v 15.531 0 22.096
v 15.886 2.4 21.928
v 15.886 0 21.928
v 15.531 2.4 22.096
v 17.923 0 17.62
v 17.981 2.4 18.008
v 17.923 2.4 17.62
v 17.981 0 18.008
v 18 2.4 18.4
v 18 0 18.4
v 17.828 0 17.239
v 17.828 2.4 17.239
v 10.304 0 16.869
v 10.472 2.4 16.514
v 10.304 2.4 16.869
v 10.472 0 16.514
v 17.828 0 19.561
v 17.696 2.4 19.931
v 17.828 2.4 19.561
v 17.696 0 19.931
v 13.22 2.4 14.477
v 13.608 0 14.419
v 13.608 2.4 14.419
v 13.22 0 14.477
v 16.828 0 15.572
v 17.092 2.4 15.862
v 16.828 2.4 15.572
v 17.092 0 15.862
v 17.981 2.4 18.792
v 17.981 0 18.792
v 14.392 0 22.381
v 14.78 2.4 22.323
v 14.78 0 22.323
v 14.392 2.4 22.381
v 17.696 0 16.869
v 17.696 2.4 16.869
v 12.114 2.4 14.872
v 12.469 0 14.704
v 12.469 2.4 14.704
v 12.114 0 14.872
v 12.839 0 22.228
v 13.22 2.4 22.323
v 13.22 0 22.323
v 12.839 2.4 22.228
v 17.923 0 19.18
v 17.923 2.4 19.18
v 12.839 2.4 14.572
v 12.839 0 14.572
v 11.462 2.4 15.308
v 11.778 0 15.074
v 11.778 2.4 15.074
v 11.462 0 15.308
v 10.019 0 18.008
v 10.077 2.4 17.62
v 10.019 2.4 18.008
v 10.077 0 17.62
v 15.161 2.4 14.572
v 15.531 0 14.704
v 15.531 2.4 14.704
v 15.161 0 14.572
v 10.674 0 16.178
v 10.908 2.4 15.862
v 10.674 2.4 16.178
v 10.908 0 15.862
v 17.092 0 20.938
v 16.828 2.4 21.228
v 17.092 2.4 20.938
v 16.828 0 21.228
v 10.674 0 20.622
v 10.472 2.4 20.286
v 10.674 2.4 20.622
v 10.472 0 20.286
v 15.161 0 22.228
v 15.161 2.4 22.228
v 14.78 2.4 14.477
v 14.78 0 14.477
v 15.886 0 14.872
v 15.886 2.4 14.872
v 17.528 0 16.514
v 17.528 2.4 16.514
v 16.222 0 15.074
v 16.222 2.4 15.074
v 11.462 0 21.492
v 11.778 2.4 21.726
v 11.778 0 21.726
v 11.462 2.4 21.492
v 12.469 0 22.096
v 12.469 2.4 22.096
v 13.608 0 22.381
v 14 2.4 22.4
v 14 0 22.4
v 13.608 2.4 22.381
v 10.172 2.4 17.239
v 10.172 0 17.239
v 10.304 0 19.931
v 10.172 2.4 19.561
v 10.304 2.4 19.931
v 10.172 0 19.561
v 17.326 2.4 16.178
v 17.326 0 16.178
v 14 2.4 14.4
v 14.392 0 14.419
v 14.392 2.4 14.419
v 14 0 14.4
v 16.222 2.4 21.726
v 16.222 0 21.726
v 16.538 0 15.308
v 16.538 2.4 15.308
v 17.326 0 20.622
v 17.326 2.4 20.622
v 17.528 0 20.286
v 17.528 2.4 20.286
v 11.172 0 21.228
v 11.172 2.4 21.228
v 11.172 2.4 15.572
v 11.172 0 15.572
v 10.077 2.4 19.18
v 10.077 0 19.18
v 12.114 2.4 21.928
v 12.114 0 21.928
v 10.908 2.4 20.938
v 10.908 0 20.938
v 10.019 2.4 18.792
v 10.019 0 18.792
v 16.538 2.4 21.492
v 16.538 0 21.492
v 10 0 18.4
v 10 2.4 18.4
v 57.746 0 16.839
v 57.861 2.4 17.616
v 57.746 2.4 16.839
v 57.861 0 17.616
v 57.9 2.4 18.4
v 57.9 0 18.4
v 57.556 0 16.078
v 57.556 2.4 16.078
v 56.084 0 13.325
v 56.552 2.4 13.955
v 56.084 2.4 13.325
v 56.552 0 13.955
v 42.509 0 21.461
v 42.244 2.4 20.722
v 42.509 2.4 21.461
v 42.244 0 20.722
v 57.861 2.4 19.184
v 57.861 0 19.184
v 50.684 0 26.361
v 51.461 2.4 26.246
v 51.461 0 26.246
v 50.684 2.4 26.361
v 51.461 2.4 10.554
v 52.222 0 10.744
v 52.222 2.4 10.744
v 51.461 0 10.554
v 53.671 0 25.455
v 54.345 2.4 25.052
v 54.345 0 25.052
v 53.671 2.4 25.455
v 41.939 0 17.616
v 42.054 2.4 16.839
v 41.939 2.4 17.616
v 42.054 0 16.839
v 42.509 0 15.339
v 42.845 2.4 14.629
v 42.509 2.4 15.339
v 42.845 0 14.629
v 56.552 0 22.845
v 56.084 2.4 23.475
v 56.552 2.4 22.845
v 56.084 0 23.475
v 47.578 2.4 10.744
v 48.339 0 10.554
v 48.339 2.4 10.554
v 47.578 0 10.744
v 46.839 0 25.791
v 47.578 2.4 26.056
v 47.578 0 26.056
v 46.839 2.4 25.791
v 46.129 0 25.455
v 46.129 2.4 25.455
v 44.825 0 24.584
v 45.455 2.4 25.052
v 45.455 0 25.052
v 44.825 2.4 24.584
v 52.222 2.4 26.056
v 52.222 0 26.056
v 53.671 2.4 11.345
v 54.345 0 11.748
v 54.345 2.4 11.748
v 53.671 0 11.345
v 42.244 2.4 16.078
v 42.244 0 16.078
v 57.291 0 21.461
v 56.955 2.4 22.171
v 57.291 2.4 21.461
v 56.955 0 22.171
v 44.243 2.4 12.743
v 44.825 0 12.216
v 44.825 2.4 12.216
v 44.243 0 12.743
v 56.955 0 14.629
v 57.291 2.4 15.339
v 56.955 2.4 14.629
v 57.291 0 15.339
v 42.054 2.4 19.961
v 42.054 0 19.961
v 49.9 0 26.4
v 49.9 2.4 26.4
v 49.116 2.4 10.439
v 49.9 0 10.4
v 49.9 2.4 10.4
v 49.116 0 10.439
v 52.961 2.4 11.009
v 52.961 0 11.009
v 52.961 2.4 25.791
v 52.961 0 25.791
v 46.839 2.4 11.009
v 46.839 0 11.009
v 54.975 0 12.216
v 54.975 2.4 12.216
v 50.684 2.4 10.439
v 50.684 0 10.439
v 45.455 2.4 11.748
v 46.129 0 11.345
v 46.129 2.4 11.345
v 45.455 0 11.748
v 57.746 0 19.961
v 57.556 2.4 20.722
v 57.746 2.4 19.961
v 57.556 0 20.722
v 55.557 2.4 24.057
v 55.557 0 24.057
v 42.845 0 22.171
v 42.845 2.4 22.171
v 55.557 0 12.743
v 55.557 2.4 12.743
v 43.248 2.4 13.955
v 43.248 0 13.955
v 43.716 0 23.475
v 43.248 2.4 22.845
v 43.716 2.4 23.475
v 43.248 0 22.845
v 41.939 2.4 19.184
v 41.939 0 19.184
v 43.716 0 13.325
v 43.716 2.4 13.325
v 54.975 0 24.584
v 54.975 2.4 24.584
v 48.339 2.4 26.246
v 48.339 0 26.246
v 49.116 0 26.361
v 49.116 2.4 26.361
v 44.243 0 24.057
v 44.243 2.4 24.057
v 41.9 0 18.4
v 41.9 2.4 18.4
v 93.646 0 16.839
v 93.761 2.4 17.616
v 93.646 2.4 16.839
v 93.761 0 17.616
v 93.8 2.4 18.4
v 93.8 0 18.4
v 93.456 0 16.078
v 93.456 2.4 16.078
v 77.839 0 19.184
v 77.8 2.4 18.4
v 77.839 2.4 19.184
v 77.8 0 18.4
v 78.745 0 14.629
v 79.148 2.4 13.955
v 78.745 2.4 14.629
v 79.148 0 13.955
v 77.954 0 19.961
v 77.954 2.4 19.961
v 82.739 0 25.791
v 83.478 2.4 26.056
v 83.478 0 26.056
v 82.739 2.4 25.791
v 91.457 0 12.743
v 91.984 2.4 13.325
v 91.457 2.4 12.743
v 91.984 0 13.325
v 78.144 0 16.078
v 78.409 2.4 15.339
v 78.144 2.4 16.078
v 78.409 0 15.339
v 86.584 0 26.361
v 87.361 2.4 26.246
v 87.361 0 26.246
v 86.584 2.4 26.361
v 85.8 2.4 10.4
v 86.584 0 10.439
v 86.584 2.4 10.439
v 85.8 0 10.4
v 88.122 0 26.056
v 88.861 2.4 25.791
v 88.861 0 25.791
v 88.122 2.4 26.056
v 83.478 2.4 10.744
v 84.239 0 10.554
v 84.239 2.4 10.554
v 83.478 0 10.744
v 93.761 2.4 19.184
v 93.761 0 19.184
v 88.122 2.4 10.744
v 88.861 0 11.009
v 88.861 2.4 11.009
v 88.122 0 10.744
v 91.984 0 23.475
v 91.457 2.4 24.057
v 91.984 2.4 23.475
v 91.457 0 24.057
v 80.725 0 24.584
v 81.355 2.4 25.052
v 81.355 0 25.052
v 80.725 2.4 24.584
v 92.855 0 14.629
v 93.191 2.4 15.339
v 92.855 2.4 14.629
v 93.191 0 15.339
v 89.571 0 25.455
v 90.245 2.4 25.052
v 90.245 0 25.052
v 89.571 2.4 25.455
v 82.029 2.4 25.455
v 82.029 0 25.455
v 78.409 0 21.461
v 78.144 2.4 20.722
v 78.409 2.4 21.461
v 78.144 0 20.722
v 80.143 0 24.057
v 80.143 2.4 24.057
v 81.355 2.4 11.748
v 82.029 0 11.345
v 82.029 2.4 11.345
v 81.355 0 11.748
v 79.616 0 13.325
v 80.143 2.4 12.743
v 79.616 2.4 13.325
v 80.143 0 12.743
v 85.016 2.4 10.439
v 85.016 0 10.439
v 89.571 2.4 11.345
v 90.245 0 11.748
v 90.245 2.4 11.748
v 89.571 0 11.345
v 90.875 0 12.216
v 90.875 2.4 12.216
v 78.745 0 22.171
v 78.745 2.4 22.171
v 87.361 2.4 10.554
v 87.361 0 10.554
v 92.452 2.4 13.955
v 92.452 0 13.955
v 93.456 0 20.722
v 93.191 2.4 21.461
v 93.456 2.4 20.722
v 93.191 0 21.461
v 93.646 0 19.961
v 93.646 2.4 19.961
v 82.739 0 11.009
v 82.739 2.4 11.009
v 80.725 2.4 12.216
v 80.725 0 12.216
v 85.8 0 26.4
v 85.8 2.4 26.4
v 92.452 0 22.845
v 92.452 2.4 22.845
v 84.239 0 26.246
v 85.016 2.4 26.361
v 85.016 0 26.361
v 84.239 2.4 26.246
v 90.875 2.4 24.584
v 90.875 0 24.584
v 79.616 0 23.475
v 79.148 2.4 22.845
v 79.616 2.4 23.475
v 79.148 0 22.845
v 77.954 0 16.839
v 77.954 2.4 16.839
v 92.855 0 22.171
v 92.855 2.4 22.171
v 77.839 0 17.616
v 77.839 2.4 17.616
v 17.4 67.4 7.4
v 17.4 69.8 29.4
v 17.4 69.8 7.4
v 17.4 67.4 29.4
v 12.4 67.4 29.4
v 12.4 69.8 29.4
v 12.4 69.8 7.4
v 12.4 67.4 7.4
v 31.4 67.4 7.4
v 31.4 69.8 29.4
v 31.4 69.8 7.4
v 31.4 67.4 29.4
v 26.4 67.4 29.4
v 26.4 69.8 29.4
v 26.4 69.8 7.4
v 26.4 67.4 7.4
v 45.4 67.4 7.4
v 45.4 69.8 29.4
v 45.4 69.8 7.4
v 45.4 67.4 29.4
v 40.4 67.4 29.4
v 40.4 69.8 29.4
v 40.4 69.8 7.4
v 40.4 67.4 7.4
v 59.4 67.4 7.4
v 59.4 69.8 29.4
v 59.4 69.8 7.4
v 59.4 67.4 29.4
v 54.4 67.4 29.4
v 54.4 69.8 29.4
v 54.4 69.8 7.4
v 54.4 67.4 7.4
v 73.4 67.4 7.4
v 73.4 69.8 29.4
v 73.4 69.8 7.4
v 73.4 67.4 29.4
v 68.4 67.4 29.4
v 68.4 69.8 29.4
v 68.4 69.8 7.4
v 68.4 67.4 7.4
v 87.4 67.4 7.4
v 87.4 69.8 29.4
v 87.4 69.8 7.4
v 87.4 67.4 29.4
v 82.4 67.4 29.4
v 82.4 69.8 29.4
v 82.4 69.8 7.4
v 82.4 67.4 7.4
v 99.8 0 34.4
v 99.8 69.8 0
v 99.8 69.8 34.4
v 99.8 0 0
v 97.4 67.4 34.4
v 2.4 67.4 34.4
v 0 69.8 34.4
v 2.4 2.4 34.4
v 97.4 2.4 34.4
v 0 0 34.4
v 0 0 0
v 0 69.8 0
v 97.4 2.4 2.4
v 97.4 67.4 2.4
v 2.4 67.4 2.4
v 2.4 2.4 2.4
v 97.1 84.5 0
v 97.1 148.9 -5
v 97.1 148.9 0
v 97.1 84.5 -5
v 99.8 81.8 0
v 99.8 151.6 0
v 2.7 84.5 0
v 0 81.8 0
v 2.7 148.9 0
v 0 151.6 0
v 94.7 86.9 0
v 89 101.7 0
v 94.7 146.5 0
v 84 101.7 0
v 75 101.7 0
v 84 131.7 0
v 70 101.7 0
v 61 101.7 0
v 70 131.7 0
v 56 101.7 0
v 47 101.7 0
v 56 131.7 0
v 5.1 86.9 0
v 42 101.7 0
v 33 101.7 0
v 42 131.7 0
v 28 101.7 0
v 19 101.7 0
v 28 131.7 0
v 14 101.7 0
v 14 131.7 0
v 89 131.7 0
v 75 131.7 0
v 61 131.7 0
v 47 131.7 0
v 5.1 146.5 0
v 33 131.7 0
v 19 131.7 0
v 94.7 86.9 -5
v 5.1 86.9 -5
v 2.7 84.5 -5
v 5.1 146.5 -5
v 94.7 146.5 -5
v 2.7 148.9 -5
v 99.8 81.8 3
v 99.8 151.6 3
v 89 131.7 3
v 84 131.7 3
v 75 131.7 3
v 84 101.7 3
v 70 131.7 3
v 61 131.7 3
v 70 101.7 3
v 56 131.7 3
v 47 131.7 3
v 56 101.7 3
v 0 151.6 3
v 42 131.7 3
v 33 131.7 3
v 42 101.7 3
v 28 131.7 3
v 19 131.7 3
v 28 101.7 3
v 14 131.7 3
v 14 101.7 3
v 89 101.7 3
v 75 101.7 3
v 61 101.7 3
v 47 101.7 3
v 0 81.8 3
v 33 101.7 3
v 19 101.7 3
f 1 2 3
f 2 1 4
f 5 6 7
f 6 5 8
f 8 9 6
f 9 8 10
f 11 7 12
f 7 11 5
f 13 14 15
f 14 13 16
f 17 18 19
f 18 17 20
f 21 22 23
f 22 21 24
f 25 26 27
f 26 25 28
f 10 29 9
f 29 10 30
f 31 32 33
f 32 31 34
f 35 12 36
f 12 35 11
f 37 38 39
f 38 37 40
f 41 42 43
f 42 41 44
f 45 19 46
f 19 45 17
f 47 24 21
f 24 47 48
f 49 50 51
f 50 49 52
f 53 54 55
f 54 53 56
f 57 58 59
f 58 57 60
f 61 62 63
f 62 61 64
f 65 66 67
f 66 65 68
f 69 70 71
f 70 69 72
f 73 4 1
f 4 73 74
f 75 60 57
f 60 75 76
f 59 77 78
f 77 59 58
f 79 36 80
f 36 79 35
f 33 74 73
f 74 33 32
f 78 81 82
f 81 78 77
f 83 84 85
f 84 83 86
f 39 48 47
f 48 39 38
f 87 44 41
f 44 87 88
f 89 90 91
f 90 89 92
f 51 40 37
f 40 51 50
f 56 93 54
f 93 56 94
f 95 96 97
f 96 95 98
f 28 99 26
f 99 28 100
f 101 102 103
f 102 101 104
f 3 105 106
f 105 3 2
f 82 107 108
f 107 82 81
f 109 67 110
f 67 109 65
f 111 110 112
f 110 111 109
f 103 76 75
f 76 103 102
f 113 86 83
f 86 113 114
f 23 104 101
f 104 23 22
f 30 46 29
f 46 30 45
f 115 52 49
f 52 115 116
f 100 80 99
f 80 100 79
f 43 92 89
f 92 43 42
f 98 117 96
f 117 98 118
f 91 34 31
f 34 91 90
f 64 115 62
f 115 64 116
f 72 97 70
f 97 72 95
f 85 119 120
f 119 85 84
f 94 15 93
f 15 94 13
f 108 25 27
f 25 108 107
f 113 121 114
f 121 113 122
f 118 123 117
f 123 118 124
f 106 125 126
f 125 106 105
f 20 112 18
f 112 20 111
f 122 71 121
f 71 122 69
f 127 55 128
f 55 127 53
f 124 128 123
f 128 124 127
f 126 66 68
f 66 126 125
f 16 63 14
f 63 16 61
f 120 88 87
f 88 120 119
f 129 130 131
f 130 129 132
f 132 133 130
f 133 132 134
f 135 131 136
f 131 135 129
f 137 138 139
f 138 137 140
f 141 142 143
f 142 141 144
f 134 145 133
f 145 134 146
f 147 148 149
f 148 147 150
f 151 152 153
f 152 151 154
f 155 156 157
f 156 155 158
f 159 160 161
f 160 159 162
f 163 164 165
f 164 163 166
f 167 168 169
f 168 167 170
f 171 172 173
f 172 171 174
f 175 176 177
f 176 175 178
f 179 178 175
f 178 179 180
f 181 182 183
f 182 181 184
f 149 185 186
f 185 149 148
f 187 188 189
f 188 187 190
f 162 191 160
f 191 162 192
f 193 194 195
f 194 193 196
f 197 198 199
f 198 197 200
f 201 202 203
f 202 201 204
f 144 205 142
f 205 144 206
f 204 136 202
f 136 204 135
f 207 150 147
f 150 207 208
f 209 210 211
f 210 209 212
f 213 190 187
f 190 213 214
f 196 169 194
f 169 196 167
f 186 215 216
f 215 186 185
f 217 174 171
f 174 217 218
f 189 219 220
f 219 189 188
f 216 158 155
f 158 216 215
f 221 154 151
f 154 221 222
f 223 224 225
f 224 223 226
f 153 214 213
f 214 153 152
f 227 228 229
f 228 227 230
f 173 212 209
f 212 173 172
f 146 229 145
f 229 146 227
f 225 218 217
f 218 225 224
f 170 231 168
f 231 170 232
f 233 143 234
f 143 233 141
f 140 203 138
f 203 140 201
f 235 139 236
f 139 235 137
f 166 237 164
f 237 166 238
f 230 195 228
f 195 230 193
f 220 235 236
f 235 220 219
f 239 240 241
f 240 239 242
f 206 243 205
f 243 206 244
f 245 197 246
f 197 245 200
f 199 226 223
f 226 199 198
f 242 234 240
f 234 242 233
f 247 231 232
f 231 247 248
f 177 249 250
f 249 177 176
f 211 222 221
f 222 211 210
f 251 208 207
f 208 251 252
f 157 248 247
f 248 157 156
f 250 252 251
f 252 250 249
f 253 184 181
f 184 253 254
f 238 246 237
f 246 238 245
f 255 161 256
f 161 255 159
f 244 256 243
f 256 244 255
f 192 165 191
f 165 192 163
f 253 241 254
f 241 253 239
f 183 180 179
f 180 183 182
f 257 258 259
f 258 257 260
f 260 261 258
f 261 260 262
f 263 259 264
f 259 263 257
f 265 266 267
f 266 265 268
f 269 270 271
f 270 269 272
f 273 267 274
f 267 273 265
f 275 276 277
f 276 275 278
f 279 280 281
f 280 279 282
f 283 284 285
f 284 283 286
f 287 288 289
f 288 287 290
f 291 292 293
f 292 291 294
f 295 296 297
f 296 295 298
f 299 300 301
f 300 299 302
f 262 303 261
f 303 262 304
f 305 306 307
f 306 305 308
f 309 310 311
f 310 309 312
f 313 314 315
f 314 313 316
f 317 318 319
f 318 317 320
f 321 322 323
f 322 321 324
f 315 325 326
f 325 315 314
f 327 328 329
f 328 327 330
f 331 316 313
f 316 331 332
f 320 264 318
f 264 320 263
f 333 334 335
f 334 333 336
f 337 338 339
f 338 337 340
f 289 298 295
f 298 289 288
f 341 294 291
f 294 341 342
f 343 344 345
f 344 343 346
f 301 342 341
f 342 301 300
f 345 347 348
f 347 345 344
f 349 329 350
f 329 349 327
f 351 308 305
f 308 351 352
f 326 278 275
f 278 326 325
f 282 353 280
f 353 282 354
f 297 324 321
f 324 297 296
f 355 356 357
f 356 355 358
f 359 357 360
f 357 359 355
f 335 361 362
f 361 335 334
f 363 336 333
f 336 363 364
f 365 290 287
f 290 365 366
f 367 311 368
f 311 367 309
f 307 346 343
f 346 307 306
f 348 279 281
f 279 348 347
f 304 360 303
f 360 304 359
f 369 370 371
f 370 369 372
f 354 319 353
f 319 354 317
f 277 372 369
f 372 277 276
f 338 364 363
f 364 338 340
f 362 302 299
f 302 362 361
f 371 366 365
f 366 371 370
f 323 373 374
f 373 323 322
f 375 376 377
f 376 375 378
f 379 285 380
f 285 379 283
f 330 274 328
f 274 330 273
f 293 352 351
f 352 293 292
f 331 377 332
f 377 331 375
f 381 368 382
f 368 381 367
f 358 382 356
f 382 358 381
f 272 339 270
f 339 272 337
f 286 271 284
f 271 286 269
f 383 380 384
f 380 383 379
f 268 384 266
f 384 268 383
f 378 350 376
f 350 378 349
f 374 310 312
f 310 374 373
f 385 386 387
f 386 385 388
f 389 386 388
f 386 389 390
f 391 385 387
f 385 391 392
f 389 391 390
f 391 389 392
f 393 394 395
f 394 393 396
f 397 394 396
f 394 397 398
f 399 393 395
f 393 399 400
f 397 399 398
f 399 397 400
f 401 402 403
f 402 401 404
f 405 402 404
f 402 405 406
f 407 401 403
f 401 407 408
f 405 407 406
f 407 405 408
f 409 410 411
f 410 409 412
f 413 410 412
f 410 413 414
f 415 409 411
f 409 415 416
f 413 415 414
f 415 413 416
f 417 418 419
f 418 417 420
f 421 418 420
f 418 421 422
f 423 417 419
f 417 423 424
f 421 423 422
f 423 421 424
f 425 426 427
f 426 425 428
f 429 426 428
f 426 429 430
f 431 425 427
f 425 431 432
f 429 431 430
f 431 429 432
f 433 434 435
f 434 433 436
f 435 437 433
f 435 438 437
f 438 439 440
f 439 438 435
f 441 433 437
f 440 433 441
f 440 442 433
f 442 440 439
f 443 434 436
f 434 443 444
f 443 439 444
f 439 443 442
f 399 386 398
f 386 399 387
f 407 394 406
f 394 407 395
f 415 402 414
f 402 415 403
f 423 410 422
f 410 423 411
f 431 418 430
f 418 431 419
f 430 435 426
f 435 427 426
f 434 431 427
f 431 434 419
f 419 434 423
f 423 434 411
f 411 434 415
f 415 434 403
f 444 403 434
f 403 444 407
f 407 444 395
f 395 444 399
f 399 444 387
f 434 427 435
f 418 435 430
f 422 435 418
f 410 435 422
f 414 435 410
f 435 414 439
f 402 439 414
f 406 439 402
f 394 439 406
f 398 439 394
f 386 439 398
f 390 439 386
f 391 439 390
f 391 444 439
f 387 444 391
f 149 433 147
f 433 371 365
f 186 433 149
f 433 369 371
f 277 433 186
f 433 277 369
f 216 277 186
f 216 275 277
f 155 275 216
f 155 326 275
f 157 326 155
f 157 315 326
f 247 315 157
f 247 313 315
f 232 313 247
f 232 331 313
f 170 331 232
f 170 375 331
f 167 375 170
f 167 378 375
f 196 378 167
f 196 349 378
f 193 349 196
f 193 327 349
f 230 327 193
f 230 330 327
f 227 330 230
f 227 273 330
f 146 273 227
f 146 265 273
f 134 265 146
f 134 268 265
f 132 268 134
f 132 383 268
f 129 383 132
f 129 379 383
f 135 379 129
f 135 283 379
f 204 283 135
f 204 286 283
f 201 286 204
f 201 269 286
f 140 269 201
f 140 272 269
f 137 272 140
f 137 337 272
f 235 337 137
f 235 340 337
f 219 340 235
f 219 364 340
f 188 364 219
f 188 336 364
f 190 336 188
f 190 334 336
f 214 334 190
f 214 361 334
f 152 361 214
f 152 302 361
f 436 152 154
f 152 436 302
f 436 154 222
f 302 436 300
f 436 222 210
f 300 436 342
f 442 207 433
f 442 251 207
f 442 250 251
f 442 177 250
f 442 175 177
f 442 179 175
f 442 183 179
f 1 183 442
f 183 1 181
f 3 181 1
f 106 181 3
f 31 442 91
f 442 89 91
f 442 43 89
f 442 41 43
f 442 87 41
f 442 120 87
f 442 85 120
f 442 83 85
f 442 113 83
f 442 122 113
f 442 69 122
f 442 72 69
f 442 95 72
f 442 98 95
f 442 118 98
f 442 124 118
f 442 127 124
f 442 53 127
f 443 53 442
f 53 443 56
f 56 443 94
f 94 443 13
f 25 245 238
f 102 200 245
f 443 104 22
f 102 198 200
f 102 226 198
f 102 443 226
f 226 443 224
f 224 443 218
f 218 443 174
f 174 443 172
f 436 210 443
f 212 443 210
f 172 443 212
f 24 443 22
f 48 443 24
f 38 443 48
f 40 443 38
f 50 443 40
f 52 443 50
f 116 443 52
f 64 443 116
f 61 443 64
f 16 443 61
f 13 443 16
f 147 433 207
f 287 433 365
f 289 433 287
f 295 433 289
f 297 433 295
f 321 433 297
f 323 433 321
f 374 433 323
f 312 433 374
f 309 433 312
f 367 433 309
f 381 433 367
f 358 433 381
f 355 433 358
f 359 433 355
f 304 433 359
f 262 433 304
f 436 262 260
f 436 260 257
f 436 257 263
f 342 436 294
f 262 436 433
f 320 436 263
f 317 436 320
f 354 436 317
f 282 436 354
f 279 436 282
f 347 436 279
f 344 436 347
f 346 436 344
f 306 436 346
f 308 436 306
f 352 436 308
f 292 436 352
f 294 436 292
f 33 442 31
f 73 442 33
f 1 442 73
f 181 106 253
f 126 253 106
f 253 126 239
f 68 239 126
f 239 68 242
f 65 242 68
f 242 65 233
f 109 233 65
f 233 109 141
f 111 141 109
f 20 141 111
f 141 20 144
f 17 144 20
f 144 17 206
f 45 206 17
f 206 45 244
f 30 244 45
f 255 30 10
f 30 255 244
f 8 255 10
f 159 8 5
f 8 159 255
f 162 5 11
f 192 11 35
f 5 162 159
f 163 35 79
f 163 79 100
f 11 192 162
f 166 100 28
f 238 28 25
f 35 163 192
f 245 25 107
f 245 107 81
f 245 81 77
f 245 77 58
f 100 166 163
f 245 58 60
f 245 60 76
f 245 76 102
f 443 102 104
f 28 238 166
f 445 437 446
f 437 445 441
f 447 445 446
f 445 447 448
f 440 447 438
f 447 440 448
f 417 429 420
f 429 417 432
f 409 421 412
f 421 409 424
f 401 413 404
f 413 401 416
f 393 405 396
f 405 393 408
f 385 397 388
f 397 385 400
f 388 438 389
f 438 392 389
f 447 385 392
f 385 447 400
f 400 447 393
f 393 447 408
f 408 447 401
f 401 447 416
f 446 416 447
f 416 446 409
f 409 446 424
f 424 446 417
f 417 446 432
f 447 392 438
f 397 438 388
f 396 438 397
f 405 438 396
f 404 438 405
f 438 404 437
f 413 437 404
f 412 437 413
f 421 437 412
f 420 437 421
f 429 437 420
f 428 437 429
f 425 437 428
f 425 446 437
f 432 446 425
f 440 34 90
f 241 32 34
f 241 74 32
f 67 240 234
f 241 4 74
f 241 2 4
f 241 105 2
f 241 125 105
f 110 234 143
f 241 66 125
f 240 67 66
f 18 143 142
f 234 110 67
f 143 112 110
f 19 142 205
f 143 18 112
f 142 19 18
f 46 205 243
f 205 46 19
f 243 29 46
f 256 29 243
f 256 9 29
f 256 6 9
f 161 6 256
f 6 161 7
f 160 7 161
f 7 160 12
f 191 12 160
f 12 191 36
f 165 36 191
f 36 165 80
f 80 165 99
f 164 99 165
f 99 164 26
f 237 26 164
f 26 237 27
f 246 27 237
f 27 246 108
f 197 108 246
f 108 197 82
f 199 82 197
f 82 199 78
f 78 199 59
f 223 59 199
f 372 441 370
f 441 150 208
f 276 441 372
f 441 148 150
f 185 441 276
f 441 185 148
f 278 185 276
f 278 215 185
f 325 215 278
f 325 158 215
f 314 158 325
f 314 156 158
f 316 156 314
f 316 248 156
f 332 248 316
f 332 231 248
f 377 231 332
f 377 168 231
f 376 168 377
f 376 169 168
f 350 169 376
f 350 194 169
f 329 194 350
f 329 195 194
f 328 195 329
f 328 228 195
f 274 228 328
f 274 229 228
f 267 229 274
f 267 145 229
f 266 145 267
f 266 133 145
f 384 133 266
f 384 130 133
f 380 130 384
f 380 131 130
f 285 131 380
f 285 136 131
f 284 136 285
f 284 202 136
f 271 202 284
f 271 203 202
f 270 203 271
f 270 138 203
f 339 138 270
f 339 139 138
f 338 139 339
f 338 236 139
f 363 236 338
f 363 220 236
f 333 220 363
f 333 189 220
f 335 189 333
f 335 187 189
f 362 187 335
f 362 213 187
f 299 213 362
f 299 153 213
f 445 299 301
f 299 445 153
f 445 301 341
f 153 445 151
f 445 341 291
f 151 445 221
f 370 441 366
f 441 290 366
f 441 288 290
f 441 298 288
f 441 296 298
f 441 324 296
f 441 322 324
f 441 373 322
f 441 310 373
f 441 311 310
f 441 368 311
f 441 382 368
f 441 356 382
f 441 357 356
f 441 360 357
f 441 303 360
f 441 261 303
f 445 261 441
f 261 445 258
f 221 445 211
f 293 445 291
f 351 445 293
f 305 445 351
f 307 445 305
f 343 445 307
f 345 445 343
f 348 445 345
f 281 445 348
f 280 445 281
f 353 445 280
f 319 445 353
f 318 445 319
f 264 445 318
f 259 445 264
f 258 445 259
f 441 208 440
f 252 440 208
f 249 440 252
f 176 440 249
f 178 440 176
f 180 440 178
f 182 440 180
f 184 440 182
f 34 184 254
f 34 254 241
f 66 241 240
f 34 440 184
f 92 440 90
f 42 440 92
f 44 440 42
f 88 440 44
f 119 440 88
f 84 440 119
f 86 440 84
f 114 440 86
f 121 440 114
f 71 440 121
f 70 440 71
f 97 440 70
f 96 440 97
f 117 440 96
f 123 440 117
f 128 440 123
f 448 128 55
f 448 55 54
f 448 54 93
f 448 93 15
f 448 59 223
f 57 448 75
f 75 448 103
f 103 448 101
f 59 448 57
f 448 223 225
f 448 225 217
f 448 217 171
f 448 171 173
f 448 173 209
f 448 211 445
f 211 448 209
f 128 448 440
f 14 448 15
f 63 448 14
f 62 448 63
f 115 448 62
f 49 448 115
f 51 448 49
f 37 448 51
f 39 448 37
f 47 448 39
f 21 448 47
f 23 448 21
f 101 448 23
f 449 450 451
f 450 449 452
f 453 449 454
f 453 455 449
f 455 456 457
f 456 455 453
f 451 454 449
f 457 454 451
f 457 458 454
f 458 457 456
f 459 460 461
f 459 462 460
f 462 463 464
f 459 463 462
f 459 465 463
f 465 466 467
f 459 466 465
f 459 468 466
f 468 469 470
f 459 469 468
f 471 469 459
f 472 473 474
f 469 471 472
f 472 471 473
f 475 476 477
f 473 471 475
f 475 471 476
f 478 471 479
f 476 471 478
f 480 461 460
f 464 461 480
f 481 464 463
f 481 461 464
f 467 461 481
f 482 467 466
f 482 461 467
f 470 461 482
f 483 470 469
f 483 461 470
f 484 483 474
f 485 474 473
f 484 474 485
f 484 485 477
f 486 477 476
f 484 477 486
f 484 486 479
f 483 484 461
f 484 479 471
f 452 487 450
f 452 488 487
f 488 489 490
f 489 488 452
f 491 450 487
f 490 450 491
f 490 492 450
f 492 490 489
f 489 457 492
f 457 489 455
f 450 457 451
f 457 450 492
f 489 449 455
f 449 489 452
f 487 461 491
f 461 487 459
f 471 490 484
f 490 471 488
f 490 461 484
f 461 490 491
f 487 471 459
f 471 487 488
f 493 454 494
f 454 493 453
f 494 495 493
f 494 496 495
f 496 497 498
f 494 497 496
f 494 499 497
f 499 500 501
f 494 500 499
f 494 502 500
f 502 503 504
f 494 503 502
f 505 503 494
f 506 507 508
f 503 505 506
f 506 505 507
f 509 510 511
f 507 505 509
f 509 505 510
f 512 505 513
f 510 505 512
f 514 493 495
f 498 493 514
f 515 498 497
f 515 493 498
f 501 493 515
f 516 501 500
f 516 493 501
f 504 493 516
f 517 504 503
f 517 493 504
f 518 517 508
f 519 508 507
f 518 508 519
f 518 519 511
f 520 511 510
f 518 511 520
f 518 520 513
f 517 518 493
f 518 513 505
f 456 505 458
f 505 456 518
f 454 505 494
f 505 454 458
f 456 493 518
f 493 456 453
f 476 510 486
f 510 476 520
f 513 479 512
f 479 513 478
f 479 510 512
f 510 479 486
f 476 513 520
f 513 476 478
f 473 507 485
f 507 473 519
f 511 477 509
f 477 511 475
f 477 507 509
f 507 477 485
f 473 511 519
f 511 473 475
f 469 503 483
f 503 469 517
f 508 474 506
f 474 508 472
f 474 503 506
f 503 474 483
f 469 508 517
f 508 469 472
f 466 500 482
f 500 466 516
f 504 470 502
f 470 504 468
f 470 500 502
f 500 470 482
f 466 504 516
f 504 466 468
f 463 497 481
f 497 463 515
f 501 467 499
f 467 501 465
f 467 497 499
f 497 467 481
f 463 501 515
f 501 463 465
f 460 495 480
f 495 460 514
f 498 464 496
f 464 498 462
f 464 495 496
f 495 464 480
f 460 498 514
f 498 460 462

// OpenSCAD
/*
 * chessnood — simple, generic control enclosure.
 *
 * A plain box + lid with a row of holes on the front face for LEDs and
 * buttons. Set how many of each and their sizes; the holes auto-space evenly
 * across the front. Big enough inside for a Raspberry Pi + wiring, but it's
 * just a box — adapt the size freely or reuse the hole layout on another model.
 *
 * Render:
 *   openscad -o box.stl -D 'part="box"' enclosure.scad
 *   openscad -o lid.stl -D 'part="lid"' enclosure.scad
 */

part = "both";          // "box" | "lid" | "both"
$fn  = 64;

/* ---- internal volume (make it fit whatever you put inside) ---- */
inner_w = 95;           // width  (X) = the front face
inner_d = 65;           // depth  (Y)
inner_h = 32;           // height (Z)
wall    = 2.4;
floor_h = 2.4;

/* ---- front-face holes ---- */
led_count  = 1;         // 1–3   (placed first, left side)
led_hole_d = 8.0;       // 5 mm LED in a panel bezel -> 8 mm hole
btn_count  = 2;         // 1–4   (placed after the LEDs)
btn_hole_d = 16.0;      // 16 mm push button -> 16 mm hole
hole_z     = 16;        // hole-centre height above the floor
edge_margin= 14;        // keep holes this far from the side walls

/* ---- lid ---- */
lid_top_t = 3.0;
lid_lip   = 5.0;
fit       = 0.3;        // lid-to-wall clearance
vent      = true;

/* ---- derived ---- */
outer_w = inner_w + 2*wall;
outer_d = inner_d + 2*wall;
box_h   = floor_h + inner_h;

module front_holes() {
    n = led_count + btn_count;
    span = outer_w - 2*edge_margin;
    for (i = [0 : n-1]) {
        x = (n == 1) ? outer_w/2 : edge_margin + span*i/(n-1);
        d = (i < led_count) ? led_hole_d : btn_hole_d;
        translate([x, -1, floor_h + hole_z])
            rotate([-90, 0, 0]) cylinder(h = wall + 2, d = d);
    }
}

module box() {
    difference() {
        cube([outer_w, outer_d, box_h]);
        translate([wall, wall, floor_h]) cube([inner_w, inner_d, box_h]);
        front_holes();
        // cable/port vents on the back wall
        if (vent)
            for (x = [wall+10 : 14 : outer_w-14])
                translate([x, outer_d-wall-1, floor_h+5])
                    cube([5, wall+2, inner_h-10]);
    }
}

module lid() {
    difference() {
        union() {
            cube([outer_w, outer_d, lid_top_t]);
            translate([wall+fit, wall+fit, -lid_lip])
                difference() {
                    cube([inner_w-2*fit, inner_d-2*fit, lid_lip]);
                    translate([wall, wall, -1])
                        cube([inner_w-2*fit-2*wall, inner_d-2*fit-2*wall, lid_lip+2]);
                }
        }
        if (vent)
            for (x = [14 : 14 : outer_w-14])
                translate([x, outer_d/2-15, -1]) cube([5, 30, lid_top_t+2]);
    }
}

if (part == "box" || part == "both") box();
if (part == "lid" || part == "both") translate([0, outer_d+12, 0]) lid();
